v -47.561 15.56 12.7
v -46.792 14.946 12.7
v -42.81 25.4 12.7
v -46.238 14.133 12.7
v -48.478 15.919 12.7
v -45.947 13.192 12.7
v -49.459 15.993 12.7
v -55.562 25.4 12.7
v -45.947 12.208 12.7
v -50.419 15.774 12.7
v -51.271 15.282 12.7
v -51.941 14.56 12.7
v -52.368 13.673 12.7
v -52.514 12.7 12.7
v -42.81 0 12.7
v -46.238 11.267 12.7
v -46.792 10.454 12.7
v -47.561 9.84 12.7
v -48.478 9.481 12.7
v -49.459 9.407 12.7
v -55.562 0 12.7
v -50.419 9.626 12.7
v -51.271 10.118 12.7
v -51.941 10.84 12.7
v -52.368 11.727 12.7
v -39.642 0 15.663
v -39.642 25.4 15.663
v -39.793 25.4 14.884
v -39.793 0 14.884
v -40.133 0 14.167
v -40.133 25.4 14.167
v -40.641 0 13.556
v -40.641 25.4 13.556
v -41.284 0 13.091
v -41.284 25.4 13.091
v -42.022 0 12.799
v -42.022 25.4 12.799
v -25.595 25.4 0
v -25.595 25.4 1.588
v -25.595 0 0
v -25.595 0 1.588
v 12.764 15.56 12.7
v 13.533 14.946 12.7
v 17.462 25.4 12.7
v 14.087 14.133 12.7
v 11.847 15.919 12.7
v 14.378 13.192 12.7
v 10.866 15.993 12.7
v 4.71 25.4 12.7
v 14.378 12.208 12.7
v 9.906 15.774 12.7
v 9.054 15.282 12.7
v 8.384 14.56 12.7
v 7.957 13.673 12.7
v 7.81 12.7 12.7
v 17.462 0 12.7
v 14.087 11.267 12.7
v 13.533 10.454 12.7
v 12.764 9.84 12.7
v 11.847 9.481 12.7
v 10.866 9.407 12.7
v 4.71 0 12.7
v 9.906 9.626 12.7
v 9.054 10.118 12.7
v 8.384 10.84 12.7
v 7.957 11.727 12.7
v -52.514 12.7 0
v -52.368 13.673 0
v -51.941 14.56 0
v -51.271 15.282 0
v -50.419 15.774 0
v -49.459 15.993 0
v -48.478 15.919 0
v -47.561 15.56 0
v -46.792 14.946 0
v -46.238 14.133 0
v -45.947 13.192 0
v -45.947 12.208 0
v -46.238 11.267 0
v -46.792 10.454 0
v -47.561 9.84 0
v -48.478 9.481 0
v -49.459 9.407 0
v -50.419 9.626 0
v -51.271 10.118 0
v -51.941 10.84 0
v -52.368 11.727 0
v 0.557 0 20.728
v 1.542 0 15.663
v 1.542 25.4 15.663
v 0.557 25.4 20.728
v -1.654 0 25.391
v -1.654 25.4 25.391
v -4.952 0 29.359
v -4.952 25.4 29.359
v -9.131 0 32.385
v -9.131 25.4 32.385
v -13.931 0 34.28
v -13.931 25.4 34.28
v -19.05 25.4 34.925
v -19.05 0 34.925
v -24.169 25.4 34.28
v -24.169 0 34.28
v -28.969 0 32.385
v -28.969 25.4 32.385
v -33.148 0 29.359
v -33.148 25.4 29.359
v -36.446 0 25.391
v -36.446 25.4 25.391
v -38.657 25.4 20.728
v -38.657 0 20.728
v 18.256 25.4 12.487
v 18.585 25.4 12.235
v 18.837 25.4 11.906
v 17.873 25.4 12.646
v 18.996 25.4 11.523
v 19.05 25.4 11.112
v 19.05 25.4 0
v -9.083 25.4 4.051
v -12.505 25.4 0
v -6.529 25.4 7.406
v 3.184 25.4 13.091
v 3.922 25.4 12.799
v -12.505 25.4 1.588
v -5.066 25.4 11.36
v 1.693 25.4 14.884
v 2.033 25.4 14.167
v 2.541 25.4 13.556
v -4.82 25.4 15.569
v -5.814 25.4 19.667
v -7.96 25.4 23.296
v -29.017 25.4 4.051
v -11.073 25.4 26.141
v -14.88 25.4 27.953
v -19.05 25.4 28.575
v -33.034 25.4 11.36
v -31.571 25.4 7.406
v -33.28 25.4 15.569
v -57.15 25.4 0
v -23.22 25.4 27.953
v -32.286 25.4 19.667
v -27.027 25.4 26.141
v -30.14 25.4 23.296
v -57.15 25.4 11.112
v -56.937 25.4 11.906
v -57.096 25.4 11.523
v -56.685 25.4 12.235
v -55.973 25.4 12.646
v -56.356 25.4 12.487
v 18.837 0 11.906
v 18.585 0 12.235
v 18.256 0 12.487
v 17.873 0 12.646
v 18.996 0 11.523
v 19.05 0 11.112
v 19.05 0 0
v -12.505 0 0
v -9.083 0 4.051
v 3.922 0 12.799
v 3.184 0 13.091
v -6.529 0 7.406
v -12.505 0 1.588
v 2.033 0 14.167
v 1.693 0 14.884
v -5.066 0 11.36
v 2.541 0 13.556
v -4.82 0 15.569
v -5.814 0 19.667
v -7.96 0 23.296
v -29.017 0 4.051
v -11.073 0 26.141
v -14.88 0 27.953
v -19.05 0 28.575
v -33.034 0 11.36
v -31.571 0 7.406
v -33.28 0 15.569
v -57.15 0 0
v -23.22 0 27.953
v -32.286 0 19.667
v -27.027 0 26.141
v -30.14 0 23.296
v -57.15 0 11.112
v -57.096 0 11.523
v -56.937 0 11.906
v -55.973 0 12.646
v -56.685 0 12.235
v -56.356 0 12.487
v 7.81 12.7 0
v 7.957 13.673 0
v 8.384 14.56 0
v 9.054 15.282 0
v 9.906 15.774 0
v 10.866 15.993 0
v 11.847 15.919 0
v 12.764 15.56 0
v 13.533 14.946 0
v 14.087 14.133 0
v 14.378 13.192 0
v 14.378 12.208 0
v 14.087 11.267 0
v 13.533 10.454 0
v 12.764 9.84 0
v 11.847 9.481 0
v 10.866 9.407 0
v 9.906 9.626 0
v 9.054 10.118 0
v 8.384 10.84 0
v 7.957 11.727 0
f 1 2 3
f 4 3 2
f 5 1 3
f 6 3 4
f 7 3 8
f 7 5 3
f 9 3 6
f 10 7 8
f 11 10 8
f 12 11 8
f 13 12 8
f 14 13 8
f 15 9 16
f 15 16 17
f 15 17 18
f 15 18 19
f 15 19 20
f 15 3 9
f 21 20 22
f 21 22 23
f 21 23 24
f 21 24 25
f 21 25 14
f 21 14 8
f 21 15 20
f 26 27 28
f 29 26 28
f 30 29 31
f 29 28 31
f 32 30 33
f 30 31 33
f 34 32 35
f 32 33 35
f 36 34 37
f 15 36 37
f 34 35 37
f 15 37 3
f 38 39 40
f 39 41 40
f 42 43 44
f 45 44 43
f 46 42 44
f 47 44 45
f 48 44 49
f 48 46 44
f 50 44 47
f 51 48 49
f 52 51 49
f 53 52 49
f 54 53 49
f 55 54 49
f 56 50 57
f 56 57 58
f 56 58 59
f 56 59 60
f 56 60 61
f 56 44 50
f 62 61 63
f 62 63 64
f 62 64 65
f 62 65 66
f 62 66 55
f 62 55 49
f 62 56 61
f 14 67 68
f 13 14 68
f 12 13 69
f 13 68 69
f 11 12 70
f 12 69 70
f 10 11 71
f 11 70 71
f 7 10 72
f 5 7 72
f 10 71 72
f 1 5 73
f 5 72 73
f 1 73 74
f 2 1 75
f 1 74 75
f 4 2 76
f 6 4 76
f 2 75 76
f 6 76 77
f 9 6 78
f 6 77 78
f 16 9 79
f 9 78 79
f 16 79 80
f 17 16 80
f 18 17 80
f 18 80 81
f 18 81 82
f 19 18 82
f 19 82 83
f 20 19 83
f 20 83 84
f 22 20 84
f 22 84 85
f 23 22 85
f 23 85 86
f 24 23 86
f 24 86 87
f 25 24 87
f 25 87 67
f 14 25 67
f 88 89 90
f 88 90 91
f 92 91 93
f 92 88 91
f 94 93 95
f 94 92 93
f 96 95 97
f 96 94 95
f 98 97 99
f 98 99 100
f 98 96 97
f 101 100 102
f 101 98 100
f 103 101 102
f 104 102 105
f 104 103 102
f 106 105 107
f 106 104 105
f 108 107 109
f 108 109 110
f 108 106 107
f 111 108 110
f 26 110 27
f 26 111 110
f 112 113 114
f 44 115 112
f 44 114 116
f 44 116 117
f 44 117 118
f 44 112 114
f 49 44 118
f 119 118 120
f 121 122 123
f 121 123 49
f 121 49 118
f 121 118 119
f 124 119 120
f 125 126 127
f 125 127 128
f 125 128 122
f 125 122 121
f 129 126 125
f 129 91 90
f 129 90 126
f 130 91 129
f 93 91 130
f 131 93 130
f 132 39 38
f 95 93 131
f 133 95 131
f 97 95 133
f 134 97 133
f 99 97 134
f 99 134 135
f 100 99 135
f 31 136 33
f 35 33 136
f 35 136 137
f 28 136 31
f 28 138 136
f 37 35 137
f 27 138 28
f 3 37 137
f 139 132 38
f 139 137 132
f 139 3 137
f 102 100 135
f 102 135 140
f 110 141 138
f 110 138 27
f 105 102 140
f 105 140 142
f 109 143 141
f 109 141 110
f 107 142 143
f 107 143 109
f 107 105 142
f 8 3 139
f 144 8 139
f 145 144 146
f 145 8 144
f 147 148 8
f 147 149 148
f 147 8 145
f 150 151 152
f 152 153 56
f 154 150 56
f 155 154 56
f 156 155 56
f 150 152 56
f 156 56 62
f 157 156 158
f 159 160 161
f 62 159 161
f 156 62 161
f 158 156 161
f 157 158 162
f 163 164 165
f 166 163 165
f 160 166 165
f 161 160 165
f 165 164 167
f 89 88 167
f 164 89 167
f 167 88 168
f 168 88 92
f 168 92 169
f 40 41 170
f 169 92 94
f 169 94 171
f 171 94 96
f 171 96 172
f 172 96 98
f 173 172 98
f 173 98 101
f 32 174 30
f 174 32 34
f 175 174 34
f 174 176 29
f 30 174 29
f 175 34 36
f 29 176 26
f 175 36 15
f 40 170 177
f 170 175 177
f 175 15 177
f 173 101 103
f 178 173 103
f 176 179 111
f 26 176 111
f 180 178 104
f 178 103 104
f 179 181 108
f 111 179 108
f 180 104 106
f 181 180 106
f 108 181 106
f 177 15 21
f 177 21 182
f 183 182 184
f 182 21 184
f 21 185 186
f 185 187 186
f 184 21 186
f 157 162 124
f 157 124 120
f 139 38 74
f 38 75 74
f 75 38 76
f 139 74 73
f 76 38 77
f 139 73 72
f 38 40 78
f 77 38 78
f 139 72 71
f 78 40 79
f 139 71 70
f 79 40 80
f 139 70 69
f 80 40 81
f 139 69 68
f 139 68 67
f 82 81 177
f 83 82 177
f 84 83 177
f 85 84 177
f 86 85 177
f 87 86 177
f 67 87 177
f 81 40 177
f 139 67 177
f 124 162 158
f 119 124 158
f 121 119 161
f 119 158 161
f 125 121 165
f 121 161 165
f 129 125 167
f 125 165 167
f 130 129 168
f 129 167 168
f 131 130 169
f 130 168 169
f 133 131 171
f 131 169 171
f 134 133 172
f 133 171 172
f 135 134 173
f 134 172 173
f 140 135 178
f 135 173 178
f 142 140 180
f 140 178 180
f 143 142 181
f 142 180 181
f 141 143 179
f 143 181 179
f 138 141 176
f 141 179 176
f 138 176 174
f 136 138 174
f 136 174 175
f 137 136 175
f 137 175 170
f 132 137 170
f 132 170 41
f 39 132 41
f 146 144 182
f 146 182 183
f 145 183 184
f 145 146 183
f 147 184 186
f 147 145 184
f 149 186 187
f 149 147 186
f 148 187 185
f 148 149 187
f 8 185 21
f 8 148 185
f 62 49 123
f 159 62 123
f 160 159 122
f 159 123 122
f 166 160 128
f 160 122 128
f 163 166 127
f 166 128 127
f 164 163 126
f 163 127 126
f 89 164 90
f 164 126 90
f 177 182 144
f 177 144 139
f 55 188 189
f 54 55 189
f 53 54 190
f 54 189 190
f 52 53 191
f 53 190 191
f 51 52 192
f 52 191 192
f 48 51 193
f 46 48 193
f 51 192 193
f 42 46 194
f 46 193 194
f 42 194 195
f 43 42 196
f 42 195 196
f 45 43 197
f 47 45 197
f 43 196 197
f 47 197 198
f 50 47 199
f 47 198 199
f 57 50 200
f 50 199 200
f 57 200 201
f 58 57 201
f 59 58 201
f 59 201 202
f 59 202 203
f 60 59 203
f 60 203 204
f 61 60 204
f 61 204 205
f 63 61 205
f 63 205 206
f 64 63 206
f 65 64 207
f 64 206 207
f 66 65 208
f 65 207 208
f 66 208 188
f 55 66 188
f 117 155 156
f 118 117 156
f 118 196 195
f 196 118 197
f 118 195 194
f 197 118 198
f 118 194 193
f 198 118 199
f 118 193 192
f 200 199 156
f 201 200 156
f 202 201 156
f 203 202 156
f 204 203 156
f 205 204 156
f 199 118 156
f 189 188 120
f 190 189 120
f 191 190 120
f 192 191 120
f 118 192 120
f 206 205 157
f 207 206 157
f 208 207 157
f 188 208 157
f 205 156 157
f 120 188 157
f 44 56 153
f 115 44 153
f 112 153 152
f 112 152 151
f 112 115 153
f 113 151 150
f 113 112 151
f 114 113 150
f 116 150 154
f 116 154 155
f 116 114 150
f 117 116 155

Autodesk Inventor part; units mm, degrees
ref_plane "YZ Plane" through (0, 0, 0) normal (1, 0, 0) x (0, 1, 0)
ref_plane "XZ Plane" through (0, 0, 0) normal (0, 1, 0) x (-1, 0, 0)
ref_plane "XY Plane" through (0, 0, 0) normal (0, 0, 1) x (1, 0, 0)
sketch "Sketch1" plane through (0, 0, 0) normal (0, 1, 0) x (-1, 0, 0)
  line L0 (0, 0) -> (38.1, 0)
  line L1 (38.1, 0) -> (38.1, 34.925)
  line L2 (38.1, 34.925) -> (0, 34.925)
  line L3 (0, 34.925) -> (0, 0)
  line L4 (19.05, 34.925) -> (19.05, 0) construction
  line L5 (-19.05, 12.7) -> (-19.05, 0)
  line L6 (-19.05, 0) -> (0, 0)
  line L7 (57.15, 12.7) -> (57.15, 0)
  line L8 (57.15, 0) -> (38.1, 0)
  line L9 (-19.05, 12.7) -> (0, 12.7)
  line L10 (38.1, 12.7) -> (57.15, 12.7)
  line L11 (0, 14.2875) -> (38.1, 14.2875) construction
  circle A0 centre (19.05, 14.2875) radius 14.2875
  line L12 (12.5046, 1.5875) -> (12.5046, 0)
  line L13 (25.5954, 1.5875) -> (25.5954, 0)
  arc A1 (39.6264, 12.7) -> (-1.5264, 12.7) centre (19.05, 14.2875) ccw
  point P0 (0, 22.225)
  point P1 (38.1, 22.225)
  dimension "d0" = 38.1
  dimension "d1" = 34.925
  dimension "d9" = 12.7
  dimension "d10" = 19.05
  dimension "d11" = 19.05
  dimension "d12" = 12.7
  dimension "d21" = 28.575
  dimension "d22" = 14.2875
  dimension "d34" = 1.5875
extrude "Extrusion1" add sketch "Sketch1" along normal blind 25.4 contours L3 A1 L1 L0 L13 A0 L12 | L6 L5 L9 L3 | L9 A1 L3 | L1 L10 L7 L8 | A1 L10 L1
fillet "Fillet1" radius 3.175 2 edges at (-39.6264, 12.7, 12.7) (1.5264, 12.7, 12.7)
fillet "Fillet1" radius 1.5875 2 edges at (19.05, 12.7, 12.7) (-57.15, 12.7, 12.7)
sketch "Sketch2" plane through (19.05, 25.4, 0) normal (0, 0, -1) x (-1, 0, 0)
  line L0 (14.3405, 0) -> (1.5875, 0) construction
  line L1 (74.6125, 0) -> (61.8595, 0) construction
  circle A0 centre (7.9375, -12.7) radius 3.302
  circle A1 centre (68.2625, -12.7) radius 3.302
  line L2 (74.6125, -25.4) -> (61.8595, -25.4) projected
  line L3 (14.3405, -25.4) -> (1.5875, -25.4) projected
  line L4 (74.6125, -25.4) -> (74.6125, 0) construction
  line L5 (1.5875, 0) -> (1.5875, -25.4) construction
  line L6 (0, -12.7) -> (76.2, -12.7) construction
  line L7 (38.1, 0) -> (38.1, -25.4) construction
  line L8 (23.8125, 0) -> (52.3875, 0) projected
  line L9 (23.8125, -25.4) -> (52.3875, -25.4) projected
  line L10 (0, -25.4) -> (0, 0) projected
  line L11 (76.2, -25.4) -> (76.2, 0) projected
  line L12 (61.8595, 0) -> (61.8595, -25.4) projected
  line L13 (14.3405, -25.4) -> (14.3405, 0) projected
  point P0 (31.5546, 0)
  point P1 (31.5546, -25.4)
  point P2 (38.1, 0)
  dimension "d15" = 6.604
  dimension "d16" = 6.604
  dimension "d24" = 30.1625
  dimension "d25" = 30.1625
  dimension "d26" = 60.325
extrude "Extrusion3" cut sketch "Sketch2" against normal through all
sketch "Sketch5" plane through (-25.5954, 0, 0) normal (0, 0, -1) x (-1, 0, 0)
  line L0 (-44.6454, 0) -> (-44.6454, 25.4) projected
  line L1 (31.5546, 0) -> (31.5546, 25.4) projected
  circle A0 centre (23.6171, 12.7) radius 3.302 projected
  circle A1 centre (-36.7079, 12.7) radius 3.302 projected
  line L2 (-44.6454, 25.4) -> (31.5546, 25.4)
  line L3 (-44.6454, 0) -> (31.5546, 0)
equation "\"d9\" = d12"
equation "\"d11\" = d10"
equation "\"d15\" = d16"
equation "\"d25\" = d24"
properties part number "Bearing Block V1.500 Drivetrain" material "Aluminum 6061"
